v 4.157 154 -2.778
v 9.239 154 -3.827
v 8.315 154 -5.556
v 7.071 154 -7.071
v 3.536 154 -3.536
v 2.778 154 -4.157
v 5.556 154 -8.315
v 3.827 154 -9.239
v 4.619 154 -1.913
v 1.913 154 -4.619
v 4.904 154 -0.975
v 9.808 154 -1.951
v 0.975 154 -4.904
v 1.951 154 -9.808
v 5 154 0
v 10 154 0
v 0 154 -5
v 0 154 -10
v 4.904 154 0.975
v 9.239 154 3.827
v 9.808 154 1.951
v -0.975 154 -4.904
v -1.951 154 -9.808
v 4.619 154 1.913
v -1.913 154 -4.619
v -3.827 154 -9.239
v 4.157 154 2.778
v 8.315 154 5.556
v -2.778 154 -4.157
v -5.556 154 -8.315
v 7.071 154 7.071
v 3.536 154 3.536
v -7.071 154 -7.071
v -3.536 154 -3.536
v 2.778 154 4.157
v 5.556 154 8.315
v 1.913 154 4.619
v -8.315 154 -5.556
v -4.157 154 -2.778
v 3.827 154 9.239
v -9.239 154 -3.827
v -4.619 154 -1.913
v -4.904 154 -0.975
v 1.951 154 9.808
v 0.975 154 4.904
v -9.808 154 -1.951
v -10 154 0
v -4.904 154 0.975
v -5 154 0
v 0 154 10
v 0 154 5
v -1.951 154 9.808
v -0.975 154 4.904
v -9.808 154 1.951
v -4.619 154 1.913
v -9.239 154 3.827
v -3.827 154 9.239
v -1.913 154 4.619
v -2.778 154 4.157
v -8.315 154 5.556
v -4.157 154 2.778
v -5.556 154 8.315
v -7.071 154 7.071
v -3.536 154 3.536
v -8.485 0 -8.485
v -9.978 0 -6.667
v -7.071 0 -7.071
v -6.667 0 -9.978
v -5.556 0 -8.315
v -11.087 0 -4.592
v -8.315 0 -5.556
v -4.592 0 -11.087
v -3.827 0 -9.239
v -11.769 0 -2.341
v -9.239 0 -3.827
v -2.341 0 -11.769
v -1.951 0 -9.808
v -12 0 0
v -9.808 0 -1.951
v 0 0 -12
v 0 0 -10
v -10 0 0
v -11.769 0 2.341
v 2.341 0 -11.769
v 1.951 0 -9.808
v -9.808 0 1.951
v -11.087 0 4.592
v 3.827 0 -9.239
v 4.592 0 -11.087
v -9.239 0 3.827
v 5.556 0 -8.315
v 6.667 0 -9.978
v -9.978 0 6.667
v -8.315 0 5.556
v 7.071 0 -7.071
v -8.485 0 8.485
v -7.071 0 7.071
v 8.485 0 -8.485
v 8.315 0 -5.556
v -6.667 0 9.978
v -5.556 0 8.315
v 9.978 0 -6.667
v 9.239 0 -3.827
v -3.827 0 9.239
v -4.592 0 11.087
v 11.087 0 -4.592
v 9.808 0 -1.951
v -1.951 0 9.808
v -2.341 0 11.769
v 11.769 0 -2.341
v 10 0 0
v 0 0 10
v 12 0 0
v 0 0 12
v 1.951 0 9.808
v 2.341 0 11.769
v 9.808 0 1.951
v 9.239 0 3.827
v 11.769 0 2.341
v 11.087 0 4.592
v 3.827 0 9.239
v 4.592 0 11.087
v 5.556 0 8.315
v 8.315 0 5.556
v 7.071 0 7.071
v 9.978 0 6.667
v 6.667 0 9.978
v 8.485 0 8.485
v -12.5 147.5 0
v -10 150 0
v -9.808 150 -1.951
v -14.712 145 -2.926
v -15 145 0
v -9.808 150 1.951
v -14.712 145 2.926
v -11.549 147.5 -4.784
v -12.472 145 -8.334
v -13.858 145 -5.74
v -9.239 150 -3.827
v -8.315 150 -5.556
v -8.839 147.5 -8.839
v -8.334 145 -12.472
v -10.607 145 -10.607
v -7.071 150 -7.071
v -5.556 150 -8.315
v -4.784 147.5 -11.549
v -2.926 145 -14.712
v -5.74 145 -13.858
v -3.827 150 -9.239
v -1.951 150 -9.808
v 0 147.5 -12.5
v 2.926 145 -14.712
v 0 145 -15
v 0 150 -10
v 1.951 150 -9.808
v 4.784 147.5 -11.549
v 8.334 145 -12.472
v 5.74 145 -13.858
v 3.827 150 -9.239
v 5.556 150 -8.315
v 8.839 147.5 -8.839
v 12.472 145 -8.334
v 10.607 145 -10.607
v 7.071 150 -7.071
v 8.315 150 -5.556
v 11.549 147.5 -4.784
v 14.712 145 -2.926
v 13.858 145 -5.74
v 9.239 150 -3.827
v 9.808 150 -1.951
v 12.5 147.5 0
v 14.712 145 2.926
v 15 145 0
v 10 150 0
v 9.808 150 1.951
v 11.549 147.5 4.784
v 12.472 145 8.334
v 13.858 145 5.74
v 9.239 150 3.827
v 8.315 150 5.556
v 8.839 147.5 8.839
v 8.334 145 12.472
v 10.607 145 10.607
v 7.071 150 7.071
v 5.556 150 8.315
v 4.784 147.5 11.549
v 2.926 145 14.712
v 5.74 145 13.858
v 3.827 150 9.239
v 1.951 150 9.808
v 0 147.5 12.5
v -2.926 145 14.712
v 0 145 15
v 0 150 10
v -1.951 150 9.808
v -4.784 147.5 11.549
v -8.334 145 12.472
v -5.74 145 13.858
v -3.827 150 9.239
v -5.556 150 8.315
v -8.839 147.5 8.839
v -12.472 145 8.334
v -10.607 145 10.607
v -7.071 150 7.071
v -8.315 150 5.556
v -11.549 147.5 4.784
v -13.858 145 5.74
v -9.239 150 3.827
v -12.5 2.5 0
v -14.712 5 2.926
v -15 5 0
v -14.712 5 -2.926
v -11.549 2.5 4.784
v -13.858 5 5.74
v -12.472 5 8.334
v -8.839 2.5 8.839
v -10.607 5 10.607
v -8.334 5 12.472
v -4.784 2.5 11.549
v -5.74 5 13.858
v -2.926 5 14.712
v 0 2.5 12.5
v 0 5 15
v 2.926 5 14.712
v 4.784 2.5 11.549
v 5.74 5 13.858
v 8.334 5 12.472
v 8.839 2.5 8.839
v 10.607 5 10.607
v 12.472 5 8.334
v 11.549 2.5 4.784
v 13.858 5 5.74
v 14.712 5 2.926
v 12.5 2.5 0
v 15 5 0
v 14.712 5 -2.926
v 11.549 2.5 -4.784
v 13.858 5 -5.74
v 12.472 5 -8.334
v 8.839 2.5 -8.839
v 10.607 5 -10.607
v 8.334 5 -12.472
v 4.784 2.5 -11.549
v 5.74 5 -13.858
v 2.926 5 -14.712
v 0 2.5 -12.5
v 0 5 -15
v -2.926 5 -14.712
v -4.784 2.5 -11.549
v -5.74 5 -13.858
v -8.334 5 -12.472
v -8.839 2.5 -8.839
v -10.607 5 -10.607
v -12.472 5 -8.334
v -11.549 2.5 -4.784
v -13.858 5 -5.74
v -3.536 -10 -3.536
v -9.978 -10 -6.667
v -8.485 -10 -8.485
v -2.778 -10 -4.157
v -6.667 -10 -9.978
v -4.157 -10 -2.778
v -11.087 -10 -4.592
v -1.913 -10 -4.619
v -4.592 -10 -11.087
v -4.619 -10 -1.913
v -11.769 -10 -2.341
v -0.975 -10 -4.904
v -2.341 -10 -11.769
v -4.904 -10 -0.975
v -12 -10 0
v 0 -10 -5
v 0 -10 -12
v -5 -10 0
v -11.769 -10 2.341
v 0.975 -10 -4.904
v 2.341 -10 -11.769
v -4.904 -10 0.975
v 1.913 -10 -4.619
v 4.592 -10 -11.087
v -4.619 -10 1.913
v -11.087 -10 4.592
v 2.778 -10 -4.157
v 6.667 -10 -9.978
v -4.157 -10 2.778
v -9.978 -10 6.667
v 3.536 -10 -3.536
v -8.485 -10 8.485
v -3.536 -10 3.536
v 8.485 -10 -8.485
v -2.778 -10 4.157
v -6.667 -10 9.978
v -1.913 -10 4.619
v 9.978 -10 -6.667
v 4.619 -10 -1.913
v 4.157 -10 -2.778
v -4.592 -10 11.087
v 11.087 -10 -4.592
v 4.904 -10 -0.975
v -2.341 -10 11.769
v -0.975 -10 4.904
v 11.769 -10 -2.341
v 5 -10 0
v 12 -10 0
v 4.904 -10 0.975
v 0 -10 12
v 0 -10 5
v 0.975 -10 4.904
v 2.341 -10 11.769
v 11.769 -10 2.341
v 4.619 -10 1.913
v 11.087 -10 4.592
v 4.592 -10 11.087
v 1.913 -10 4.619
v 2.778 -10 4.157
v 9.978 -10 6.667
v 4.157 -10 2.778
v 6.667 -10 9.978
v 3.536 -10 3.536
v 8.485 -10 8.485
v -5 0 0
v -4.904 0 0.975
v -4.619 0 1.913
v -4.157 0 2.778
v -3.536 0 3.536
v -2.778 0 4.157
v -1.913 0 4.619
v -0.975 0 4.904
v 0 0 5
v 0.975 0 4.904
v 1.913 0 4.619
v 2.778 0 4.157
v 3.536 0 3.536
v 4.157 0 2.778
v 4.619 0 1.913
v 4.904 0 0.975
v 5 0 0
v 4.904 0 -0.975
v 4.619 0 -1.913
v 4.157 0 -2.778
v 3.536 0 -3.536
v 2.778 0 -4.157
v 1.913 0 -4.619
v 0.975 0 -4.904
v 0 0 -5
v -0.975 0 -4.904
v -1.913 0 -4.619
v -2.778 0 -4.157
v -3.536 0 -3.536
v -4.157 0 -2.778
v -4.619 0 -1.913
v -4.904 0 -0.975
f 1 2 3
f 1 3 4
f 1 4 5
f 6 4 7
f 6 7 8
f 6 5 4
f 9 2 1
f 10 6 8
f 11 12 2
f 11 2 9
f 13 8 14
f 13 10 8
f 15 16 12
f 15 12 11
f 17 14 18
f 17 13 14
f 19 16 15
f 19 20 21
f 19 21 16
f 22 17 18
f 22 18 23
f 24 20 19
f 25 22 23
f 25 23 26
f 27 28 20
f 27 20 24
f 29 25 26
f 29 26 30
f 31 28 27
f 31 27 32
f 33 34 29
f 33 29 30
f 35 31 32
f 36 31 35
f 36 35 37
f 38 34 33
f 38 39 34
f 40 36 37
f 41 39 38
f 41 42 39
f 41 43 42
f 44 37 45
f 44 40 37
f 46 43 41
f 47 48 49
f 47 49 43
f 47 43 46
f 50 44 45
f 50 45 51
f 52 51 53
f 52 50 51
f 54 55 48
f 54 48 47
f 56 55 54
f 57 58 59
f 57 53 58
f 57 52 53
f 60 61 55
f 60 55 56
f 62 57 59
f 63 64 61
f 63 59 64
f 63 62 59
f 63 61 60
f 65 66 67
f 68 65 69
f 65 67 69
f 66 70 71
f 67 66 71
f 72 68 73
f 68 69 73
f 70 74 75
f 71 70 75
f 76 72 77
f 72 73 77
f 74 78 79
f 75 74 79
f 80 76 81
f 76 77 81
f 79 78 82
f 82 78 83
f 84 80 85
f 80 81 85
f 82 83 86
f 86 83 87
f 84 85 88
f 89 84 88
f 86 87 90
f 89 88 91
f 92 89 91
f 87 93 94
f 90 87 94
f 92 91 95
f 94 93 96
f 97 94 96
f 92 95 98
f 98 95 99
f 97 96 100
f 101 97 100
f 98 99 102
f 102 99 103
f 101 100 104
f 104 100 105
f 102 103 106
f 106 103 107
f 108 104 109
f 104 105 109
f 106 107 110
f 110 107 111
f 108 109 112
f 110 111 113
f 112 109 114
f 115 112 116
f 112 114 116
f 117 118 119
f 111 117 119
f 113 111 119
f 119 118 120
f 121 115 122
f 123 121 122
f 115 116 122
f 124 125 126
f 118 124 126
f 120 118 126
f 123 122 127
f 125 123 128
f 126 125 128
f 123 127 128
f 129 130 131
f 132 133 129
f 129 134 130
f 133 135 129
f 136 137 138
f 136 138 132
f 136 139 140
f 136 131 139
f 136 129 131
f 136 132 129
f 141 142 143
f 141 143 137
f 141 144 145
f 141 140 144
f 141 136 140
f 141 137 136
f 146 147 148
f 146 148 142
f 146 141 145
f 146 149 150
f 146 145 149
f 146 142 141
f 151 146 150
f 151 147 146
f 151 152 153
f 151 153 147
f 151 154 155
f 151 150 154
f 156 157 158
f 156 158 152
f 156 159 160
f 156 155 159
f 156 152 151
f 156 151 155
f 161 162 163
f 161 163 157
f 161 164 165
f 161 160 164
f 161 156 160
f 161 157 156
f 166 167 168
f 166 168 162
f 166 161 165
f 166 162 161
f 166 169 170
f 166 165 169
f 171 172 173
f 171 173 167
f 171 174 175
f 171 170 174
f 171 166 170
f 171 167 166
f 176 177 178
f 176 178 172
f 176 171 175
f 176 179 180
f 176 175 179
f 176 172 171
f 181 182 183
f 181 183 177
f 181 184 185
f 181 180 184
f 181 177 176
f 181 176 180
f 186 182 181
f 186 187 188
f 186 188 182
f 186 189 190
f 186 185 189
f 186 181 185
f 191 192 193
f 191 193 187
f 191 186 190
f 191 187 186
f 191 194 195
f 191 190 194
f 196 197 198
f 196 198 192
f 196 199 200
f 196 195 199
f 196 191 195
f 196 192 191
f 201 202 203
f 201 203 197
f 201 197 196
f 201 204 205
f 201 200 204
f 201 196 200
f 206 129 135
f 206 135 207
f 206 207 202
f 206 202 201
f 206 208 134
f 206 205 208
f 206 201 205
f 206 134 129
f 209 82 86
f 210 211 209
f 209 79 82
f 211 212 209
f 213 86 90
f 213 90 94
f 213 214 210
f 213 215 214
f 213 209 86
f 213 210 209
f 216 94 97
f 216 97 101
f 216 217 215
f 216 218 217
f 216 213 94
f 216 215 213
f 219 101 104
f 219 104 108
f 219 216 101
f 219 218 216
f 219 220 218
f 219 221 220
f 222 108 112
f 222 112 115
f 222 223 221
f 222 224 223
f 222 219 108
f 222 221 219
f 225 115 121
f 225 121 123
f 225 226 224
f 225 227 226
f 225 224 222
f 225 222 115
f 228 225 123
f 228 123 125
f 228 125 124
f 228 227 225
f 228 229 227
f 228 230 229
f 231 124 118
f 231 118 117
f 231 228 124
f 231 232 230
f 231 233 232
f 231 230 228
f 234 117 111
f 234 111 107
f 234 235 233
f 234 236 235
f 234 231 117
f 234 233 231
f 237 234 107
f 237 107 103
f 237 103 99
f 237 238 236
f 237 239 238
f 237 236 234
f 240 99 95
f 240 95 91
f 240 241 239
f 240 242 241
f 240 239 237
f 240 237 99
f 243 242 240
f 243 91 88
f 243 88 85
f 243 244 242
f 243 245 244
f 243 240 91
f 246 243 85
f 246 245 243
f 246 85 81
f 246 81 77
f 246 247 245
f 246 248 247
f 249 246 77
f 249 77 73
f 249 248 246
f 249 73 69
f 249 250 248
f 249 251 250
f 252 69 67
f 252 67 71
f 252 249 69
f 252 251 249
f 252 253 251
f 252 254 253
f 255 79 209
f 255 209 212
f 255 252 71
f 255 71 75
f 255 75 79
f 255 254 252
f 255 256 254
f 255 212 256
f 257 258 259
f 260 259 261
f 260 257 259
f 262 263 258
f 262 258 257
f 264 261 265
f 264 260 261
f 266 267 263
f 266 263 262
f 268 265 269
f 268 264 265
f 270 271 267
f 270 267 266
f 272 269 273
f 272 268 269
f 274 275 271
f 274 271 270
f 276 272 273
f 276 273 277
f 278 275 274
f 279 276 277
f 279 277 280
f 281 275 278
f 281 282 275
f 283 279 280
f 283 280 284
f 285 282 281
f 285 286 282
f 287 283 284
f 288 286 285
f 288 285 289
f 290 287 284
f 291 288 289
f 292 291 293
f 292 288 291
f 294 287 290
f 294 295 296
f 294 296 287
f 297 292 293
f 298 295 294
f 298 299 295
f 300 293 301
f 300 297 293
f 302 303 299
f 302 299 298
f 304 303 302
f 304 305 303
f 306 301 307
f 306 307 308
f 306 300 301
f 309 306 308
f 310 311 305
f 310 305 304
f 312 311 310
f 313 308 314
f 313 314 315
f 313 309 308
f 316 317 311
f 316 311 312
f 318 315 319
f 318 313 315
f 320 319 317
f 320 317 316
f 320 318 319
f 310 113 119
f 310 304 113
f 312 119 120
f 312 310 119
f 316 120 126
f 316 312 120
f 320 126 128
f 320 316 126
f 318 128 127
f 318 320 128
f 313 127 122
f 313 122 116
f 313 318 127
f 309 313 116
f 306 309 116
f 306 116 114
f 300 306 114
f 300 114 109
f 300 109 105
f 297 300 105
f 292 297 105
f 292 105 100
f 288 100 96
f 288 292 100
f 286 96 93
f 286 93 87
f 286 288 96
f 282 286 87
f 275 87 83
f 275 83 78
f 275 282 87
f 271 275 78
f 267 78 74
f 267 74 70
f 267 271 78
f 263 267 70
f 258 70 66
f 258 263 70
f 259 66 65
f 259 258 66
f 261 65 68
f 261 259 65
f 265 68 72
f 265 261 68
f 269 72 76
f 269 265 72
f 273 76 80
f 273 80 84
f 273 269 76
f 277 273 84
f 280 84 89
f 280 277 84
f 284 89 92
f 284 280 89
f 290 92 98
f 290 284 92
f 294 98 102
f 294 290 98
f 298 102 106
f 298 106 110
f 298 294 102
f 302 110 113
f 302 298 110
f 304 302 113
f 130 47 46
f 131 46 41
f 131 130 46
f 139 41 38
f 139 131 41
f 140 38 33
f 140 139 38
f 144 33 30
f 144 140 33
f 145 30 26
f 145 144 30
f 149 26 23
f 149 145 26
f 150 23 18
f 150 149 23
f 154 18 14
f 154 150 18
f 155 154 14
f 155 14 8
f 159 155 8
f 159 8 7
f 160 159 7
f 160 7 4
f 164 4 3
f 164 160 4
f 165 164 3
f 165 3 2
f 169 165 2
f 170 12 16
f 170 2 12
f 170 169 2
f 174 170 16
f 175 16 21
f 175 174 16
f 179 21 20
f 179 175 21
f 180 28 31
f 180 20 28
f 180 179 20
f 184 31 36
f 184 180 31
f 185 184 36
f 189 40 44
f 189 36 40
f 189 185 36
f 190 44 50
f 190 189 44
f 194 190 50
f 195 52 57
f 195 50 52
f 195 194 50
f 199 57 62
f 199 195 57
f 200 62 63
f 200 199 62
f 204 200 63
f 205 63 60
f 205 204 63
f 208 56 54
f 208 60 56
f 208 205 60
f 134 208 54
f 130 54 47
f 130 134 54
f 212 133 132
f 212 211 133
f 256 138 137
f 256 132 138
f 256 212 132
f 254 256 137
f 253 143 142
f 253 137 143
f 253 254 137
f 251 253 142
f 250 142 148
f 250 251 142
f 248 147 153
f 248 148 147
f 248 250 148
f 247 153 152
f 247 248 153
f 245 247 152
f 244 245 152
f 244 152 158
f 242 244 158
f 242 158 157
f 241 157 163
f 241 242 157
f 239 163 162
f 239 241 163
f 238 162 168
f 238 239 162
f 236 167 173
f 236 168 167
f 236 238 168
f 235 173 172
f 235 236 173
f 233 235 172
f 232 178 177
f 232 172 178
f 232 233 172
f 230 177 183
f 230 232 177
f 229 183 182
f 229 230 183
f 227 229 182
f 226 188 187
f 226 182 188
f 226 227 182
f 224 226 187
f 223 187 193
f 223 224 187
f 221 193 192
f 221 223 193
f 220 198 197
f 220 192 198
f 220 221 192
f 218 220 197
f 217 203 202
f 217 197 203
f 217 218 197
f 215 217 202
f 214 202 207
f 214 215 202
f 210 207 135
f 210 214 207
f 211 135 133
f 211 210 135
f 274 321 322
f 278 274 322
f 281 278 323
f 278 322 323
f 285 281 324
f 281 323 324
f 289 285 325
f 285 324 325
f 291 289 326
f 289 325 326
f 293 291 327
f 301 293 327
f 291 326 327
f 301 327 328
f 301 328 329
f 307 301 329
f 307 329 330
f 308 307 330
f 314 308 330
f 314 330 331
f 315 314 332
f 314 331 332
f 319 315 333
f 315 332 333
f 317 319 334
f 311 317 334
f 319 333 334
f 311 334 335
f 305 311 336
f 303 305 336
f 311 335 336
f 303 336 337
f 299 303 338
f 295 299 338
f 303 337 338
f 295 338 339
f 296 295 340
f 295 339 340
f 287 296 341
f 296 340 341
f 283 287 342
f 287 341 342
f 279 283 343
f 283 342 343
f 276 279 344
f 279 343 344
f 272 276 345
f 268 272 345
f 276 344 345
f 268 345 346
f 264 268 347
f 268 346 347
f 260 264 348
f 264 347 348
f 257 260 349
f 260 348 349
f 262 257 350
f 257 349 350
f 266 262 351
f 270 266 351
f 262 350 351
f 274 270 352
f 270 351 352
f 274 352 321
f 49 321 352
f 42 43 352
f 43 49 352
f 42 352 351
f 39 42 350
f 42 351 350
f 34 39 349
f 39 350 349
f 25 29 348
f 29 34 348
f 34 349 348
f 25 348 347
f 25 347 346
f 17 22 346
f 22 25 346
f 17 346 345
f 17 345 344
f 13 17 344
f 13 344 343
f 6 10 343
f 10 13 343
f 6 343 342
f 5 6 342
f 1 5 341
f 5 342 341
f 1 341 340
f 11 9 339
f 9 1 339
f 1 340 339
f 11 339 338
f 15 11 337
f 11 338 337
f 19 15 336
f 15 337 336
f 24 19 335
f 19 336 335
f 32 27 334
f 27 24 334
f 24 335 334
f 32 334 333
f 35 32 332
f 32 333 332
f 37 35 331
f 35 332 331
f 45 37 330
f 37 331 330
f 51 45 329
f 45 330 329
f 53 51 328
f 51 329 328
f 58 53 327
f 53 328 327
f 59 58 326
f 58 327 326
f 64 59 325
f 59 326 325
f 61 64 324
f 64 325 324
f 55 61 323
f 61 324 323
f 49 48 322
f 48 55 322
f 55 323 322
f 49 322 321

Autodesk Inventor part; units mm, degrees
ref_plane "YZ Plane" through (0, 0, 0) normal (1, 0, 0) x (0, 1, 0)
ref_plane "XZ Plane" through (0, 0, 0) normal (0, 1, 0) x (-1, 0, 0)
ref_plane "XY Plane" through (0, 0, 0) normal (0, 0, 1) x (1, 0, 0)
sketch "Esquisse1" plane through (0, 0, 0) normal (0, 1, 0) x (-1, 0, 0)
  circle A0 centre (0, 0) radius 15
  dimension "d0" = 30
extrude "Extrusion1" add sketch "Esquisse1" along normal blind 150
sketch "Esquisse2" plane through (0, 0, 0) normal (0, 1, 0) x (-1, 0, 0)
  circle A0 centre (0, 0) radius 10
  dimension "d5" = 20
extrude "Extrusion2" add sketch "Esquisse2" along normal blind 154 and the other way blind 5
thread "Filetage2" size "M17x1.5" class "6g" standard "ANSI Metric M Profile" length 4
chamfer "Chanfrein1" distance 5 angle 45 1 edges at (15, 150, 0)
chamfer "Chanfrein2" distance 5 angle 45 1 edges at (15, 0, 0)
sketch "Esquisse5" plane through (0, -5, 0) normal (0, -1, 0) x (1, 0, 0)
  circle A0 centre (0, 0) radius 12
  dimension "d24" = 24
extrude "Extrusion4" add sketch "Esquisse5" along normal blind 5 and the other way blind 5
sketch "Esquisse3" plane through (0, 0, 0) normal (0, 1, 0) x (-1, 0, 0)
  circle A0 centre (0, 0) radius 10 projected
  circle A1 centre (0, 0) radius 5
  dimension "d33" = 10
extrude "Extrusion3" cut sketch "Esquisse3" along normal blind 154 and the other way blind 72 contours A1
thread "Filetage5" size "M24x3" class "6g" standard "ANSI Metric M Profile" length 5 offset 5
properties part number "Manche interm"
